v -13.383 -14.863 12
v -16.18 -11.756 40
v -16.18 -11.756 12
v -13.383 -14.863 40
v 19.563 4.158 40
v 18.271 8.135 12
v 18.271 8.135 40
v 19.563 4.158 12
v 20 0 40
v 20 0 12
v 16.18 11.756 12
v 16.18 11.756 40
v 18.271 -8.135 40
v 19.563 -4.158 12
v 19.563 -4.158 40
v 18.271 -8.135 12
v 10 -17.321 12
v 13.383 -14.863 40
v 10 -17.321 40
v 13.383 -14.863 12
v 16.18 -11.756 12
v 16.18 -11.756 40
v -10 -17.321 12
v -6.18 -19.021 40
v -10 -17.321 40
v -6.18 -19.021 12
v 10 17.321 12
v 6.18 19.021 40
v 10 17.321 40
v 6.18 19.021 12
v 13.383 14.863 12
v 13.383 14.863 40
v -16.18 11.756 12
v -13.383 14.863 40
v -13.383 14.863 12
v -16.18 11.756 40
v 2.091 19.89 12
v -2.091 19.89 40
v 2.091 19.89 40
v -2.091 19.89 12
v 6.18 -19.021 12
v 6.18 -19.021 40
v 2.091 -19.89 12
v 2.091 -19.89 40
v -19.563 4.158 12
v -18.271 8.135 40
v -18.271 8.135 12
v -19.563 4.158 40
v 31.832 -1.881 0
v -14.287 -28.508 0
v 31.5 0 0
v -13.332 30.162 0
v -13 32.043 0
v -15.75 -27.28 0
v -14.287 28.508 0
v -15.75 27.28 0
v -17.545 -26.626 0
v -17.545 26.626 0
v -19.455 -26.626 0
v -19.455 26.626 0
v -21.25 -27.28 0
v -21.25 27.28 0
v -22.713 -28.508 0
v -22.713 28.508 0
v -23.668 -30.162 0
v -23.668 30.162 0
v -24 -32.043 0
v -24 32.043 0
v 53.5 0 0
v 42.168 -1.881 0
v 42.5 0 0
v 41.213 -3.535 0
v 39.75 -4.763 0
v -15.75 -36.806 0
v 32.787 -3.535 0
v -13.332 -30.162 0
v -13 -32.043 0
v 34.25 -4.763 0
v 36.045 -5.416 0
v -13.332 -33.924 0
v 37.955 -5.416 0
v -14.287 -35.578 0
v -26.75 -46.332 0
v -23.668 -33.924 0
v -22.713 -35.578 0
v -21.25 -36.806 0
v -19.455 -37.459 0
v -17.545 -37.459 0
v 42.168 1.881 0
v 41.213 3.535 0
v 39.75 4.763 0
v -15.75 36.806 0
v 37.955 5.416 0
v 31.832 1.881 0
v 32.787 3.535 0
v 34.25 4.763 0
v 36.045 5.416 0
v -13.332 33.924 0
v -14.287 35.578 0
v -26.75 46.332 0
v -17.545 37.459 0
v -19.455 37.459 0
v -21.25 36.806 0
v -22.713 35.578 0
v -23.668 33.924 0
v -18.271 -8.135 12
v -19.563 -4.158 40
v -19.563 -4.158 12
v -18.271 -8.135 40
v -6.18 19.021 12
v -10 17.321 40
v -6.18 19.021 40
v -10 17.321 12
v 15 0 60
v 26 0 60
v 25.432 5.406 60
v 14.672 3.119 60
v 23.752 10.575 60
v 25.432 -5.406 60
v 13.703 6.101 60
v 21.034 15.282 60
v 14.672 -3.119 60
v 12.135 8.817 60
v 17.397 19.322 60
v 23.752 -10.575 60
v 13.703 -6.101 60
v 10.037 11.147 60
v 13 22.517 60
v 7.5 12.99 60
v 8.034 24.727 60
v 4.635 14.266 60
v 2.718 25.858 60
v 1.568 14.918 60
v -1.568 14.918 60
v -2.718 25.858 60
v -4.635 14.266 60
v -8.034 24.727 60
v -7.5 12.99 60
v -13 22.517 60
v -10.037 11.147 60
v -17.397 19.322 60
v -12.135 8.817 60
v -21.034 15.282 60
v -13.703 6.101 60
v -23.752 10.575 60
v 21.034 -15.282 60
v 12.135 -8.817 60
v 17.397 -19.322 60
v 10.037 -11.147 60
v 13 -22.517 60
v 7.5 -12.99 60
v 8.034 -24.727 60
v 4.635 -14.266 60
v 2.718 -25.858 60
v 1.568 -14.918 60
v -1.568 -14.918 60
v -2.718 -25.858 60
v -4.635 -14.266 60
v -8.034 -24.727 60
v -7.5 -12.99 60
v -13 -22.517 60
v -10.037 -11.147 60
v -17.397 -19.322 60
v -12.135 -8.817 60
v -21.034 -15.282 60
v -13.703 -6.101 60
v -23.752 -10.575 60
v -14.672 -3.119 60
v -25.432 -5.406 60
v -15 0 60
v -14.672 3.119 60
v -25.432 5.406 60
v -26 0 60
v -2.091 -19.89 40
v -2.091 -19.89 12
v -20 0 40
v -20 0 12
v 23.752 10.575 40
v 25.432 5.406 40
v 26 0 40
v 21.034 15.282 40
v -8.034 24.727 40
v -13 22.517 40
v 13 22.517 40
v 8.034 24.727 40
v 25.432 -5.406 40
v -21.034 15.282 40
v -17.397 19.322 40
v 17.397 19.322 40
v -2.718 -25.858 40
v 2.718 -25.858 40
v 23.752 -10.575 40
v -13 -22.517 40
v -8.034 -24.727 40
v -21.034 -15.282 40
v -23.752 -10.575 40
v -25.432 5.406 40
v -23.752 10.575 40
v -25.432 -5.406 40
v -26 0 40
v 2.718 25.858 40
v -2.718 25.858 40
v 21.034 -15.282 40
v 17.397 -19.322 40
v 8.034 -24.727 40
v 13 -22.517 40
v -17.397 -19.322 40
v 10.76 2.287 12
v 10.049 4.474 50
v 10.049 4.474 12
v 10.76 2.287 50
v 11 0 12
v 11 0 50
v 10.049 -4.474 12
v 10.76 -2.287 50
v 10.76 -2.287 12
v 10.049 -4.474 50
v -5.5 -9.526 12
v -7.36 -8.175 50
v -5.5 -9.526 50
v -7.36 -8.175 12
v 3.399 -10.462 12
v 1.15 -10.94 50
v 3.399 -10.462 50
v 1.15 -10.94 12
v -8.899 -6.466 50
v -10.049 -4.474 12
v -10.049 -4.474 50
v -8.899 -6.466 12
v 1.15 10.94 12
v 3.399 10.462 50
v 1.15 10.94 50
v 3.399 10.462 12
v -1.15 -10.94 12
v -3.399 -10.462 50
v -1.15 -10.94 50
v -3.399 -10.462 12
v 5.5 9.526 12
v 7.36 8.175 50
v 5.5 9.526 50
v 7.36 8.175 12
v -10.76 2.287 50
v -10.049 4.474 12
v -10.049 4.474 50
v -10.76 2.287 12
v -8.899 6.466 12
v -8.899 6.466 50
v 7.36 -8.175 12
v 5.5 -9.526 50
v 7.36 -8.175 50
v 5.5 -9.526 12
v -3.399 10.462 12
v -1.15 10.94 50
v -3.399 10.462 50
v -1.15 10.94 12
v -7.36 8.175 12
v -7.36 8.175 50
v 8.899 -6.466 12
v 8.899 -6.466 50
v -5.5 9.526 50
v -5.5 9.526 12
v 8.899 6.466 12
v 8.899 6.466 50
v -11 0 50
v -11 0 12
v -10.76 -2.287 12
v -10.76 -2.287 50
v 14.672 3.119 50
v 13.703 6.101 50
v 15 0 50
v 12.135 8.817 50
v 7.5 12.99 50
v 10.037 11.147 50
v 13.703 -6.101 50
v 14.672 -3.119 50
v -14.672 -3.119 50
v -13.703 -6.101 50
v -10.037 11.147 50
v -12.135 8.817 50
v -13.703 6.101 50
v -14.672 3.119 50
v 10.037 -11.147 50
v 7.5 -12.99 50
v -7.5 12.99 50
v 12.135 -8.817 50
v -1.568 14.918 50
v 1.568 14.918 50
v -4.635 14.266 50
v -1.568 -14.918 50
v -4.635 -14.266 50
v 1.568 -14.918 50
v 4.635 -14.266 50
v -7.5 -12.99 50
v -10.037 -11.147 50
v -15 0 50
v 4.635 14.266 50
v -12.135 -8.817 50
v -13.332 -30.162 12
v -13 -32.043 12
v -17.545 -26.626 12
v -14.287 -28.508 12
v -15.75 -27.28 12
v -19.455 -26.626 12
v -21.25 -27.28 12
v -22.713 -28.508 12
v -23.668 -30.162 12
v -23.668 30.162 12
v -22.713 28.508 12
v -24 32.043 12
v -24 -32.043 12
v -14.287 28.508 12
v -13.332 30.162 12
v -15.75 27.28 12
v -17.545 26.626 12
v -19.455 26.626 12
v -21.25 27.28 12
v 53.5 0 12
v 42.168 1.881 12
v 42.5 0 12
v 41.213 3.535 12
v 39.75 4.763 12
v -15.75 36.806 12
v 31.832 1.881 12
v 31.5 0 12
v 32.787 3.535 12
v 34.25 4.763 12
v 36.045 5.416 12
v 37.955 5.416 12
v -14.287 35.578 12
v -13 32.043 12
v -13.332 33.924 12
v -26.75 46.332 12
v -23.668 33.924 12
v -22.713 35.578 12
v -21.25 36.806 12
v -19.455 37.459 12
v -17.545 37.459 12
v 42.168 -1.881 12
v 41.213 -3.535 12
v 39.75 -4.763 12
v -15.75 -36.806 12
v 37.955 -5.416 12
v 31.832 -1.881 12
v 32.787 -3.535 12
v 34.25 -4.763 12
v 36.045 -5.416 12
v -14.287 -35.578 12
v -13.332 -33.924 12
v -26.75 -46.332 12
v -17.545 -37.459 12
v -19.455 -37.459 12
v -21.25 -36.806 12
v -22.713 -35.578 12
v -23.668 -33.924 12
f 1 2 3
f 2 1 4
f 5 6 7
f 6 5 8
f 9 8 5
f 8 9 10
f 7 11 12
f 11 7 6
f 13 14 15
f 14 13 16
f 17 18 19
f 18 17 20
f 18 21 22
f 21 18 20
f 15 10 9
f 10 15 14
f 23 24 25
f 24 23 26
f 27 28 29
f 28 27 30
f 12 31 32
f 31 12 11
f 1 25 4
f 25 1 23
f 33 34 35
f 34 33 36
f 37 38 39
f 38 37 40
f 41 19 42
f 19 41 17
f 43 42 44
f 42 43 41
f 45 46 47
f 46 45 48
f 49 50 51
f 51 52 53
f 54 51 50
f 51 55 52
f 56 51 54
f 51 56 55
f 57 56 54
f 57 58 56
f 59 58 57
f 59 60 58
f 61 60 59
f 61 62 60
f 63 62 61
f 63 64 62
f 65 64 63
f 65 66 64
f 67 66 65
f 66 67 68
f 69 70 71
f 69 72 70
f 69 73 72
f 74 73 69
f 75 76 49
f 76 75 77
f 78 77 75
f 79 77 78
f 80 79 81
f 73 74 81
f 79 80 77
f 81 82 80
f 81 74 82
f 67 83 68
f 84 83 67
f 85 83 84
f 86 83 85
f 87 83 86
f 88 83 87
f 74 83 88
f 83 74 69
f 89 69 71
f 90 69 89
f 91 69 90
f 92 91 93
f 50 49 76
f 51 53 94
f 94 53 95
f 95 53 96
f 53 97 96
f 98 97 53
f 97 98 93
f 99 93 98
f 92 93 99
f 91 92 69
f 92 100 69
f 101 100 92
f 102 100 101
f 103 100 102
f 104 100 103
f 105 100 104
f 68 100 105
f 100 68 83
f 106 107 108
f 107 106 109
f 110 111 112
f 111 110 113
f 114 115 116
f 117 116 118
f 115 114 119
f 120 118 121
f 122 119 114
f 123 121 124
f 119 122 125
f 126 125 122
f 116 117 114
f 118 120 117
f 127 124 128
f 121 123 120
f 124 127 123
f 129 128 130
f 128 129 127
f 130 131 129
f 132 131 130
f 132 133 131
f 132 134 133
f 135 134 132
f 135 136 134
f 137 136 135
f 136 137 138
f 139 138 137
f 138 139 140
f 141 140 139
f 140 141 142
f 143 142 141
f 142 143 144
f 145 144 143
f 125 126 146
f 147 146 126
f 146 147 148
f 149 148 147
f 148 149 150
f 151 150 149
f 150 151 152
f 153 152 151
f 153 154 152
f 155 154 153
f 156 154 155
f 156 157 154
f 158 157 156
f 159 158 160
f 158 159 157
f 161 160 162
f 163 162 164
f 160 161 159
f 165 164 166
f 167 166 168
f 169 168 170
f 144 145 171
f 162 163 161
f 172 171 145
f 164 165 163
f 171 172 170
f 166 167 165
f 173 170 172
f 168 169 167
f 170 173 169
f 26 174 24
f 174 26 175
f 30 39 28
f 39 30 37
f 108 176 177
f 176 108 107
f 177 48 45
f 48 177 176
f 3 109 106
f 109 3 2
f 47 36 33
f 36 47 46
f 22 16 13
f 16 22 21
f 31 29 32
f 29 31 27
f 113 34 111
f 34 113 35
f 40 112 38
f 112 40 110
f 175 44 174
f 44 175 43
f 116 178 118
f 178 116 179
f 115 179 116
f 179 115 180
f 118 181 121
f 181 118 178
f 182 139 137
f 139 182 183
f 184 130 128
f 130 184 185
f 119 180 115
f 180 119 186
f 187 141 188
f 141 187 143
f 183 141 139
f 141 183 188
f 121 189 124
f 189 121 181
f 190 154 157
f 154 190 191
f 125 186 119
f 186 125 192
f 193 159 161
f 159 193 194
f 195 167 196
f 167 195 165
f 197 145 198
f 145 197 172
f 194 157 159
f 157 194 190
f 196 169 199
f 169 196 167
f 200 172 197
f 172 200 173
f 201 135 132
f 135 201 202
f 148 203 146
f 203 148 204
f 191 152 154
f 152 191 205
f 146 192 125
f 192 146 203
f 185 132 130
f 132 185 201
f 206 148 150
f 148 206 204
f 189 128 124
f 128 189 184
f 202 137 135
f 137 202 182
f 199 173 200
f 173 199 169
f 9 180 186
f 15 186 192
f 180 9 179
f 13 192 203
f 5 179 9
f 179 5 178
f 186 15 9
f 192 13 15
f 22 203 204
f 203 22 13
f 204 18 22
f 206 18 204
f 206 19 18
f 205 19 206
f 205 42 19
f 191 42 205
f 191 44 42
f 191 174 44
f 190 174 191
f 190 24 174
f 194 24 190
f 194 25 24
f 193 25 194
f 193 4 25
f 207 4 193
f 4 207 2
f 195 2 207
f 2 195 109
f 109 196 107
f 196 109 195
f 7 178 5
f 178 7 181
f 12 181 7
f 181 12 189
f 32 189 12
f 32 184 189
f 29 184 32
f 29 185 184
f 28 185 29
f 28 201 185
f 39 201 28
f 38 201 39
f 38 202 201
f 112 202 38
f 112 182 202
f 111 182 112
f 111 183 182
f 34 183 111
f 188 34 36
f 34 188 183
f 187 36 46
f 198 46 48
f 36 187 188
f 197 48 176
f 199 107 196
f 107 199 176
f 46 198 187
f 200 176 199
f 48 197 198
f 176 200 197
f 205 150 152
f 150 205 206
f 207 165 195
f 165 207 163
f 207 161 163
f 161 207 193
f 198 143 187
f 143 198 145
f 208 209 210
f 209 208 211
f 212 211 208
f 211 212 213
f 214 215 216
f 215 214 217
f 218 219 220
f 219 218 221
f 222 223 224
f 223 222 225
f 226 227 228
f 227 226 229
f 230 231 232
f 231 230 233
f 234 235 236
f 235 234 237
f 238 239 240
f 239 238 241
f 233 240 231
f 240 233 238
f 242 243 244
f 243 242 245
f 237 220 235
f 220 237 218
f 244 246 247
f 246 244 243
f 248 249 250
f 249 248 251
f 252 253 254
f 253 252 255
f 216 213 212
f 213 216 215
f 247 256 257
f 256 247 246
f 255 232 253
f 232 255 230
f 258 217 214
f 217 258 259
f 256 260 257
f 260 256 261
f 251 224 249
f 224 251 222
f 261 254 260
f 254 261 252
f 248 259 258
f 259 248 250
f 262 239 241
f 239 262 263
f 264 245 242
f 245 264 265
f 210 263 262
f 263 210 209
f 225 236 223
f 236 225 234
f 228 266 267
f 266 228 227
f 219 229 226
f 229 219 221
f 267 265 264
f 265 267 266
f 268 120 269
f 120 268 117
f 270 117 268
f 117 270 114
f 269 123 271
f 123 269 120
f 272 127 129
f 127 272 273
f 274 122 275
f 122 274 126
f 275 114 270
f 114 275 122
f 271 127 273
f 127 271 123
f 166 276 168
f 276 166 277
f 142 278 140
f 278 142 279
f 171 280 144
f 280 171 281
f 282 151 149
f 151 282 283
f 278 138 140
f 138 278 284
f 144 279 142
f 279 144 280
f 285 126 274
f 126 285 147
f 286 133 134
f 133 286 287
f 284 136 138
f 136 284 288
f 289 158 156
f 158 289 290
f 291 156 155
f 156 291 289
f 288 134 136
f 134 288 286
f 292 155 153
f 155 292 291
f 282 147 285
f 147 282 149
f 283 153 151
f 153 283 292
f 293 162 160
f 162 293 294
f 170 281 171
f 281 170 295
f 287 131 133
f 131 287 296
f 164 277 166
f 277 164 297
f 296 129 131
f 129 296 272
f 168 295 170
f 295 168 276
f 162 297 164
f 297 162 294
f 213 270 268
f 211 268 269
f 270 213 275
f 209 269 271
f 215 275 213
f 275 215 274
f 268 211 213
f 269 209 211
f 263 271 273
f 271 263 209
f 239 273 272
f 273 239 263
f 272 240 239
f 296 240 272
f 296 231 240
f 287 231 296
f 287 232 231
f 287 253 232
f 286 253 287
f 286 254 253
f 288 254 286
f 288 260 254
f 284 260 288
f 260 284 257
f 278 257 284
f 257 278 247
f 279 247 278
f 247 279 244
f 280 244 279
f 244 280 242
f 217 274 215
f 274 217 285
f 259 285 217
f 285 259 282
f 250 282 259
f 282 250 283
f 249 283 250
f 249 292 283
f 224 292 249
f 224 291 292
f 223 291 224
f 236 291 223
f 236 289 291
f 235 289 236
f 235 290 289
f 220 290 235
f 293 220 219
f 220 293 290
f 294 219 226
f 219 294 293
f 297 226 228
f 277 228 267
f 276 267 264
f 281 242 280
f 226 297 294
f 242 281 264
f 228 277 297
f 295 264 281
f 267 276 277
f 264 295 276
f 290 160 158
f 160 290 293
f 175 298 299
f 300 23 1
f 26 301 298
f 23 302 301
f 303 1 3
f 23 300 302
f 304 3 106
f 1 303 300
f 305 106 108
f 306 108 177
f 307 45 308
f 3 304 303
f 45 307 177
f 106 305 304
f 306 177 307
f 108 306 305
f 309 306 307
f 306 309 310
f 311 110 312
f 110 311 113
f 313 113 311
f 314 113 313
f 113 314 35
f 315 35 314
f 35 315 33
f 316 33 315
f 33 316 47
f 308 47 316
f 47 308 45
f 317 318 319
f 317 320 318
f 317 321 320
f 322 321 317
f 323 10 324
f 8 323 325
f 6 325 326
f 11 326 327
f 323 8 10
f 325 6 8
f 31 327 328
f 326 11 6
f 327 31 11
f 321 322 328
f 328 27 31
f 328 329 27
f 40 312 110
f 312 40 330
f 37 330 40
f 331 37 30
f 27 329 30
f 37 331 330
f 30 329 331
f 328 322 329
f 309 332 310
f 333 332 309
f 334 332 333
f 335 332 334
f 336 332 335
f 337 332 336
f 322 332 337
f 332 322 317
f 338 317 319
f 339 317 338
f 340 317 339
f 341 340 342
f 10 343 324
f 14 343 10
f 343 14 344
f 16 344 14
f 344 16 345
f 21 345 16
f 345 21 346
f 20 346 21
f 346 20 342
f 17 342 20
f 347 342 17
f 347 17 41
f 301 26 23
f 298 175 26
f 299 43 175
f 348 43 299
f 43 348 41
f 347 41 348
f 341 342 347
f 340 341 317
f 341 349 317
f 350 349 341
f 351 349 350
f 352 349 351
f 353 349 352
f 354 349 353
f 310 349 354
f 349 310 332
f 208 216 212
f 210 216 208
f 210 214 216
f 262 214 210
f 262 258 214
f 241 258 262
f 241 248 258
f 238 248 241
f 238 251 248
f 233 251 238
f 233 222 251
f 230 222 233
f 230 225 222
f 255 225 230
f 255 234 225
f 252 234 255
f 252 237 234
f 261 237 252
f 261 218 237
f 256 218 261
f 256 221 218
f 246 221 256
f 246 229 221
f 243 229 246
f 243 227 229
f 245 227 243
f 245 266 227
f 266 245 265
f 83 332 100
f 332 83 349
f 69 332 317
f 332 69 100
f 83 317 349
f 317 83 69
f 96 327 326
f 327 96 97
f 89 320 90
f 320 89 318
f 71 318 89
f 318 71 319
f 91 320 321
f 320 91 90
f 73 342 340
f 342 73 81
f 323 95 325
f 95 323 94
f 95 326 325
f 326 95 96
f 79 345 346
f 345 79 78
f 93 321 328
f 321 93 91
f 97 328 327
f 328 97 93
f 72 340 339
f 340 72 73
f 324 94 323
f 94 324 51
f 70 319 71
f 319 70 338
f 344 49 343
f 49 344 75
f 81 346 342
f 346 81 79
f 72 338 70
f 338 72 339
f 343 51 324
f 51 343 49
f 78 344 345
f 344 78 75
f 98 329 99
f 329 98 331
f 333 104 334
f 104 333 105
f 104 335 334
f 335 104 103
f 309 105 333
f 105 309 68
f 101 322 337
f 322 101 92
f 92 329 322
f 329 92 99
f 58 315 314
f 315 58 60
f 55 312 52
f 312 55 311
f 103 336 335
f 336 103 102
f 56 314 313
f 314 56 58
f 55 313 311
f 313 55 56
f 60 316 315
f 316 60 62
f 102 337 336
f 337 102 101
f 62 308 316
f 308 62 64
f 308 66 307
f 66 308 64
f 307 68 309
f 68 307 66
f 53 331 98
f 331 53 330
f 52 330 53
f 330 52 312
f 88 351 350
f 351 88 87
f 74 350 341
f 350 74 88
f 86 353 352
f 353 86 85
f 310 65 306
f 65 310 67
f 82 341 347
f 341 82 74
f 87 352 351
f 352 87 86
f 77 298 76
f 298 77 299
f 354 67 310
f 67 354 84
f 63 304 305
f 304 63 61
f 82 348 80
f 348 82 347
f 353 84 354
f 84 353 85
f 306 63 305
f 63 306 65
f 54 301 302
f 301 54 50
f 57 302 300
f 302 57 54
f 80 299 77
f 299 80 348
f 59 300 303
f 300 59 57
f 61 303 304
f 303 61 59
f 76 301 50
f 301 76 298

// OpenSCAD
module welle(){
        cylinder(d=40,h = 60);
        translate([0,0,40])cylinder(d=52, h = 60-40);
    
    
}
difference(){
    welle();
    translate([0,0,-1])cylinder(d =30, h =8+1);
    translate([0,0,-1])cylinder(d=22, h = 60+2);
    translate([0,0,60-10])cylinder(d=30,h=10+1);
}
module base(){
    for(i=[0:120:240]){
        rotate([0,0,i])translate([74/2,0,0])cylinder(d = 16, h = 12);
    }
    cylinder(h=12, d =74+33, $fn=3);
}
difference(){
    base();
    for(i=[0:120:240]){
        rotate([0,0,i])translate([74/2,0,-1])cylinder(d = 11, h = 12+2);
    }
}
